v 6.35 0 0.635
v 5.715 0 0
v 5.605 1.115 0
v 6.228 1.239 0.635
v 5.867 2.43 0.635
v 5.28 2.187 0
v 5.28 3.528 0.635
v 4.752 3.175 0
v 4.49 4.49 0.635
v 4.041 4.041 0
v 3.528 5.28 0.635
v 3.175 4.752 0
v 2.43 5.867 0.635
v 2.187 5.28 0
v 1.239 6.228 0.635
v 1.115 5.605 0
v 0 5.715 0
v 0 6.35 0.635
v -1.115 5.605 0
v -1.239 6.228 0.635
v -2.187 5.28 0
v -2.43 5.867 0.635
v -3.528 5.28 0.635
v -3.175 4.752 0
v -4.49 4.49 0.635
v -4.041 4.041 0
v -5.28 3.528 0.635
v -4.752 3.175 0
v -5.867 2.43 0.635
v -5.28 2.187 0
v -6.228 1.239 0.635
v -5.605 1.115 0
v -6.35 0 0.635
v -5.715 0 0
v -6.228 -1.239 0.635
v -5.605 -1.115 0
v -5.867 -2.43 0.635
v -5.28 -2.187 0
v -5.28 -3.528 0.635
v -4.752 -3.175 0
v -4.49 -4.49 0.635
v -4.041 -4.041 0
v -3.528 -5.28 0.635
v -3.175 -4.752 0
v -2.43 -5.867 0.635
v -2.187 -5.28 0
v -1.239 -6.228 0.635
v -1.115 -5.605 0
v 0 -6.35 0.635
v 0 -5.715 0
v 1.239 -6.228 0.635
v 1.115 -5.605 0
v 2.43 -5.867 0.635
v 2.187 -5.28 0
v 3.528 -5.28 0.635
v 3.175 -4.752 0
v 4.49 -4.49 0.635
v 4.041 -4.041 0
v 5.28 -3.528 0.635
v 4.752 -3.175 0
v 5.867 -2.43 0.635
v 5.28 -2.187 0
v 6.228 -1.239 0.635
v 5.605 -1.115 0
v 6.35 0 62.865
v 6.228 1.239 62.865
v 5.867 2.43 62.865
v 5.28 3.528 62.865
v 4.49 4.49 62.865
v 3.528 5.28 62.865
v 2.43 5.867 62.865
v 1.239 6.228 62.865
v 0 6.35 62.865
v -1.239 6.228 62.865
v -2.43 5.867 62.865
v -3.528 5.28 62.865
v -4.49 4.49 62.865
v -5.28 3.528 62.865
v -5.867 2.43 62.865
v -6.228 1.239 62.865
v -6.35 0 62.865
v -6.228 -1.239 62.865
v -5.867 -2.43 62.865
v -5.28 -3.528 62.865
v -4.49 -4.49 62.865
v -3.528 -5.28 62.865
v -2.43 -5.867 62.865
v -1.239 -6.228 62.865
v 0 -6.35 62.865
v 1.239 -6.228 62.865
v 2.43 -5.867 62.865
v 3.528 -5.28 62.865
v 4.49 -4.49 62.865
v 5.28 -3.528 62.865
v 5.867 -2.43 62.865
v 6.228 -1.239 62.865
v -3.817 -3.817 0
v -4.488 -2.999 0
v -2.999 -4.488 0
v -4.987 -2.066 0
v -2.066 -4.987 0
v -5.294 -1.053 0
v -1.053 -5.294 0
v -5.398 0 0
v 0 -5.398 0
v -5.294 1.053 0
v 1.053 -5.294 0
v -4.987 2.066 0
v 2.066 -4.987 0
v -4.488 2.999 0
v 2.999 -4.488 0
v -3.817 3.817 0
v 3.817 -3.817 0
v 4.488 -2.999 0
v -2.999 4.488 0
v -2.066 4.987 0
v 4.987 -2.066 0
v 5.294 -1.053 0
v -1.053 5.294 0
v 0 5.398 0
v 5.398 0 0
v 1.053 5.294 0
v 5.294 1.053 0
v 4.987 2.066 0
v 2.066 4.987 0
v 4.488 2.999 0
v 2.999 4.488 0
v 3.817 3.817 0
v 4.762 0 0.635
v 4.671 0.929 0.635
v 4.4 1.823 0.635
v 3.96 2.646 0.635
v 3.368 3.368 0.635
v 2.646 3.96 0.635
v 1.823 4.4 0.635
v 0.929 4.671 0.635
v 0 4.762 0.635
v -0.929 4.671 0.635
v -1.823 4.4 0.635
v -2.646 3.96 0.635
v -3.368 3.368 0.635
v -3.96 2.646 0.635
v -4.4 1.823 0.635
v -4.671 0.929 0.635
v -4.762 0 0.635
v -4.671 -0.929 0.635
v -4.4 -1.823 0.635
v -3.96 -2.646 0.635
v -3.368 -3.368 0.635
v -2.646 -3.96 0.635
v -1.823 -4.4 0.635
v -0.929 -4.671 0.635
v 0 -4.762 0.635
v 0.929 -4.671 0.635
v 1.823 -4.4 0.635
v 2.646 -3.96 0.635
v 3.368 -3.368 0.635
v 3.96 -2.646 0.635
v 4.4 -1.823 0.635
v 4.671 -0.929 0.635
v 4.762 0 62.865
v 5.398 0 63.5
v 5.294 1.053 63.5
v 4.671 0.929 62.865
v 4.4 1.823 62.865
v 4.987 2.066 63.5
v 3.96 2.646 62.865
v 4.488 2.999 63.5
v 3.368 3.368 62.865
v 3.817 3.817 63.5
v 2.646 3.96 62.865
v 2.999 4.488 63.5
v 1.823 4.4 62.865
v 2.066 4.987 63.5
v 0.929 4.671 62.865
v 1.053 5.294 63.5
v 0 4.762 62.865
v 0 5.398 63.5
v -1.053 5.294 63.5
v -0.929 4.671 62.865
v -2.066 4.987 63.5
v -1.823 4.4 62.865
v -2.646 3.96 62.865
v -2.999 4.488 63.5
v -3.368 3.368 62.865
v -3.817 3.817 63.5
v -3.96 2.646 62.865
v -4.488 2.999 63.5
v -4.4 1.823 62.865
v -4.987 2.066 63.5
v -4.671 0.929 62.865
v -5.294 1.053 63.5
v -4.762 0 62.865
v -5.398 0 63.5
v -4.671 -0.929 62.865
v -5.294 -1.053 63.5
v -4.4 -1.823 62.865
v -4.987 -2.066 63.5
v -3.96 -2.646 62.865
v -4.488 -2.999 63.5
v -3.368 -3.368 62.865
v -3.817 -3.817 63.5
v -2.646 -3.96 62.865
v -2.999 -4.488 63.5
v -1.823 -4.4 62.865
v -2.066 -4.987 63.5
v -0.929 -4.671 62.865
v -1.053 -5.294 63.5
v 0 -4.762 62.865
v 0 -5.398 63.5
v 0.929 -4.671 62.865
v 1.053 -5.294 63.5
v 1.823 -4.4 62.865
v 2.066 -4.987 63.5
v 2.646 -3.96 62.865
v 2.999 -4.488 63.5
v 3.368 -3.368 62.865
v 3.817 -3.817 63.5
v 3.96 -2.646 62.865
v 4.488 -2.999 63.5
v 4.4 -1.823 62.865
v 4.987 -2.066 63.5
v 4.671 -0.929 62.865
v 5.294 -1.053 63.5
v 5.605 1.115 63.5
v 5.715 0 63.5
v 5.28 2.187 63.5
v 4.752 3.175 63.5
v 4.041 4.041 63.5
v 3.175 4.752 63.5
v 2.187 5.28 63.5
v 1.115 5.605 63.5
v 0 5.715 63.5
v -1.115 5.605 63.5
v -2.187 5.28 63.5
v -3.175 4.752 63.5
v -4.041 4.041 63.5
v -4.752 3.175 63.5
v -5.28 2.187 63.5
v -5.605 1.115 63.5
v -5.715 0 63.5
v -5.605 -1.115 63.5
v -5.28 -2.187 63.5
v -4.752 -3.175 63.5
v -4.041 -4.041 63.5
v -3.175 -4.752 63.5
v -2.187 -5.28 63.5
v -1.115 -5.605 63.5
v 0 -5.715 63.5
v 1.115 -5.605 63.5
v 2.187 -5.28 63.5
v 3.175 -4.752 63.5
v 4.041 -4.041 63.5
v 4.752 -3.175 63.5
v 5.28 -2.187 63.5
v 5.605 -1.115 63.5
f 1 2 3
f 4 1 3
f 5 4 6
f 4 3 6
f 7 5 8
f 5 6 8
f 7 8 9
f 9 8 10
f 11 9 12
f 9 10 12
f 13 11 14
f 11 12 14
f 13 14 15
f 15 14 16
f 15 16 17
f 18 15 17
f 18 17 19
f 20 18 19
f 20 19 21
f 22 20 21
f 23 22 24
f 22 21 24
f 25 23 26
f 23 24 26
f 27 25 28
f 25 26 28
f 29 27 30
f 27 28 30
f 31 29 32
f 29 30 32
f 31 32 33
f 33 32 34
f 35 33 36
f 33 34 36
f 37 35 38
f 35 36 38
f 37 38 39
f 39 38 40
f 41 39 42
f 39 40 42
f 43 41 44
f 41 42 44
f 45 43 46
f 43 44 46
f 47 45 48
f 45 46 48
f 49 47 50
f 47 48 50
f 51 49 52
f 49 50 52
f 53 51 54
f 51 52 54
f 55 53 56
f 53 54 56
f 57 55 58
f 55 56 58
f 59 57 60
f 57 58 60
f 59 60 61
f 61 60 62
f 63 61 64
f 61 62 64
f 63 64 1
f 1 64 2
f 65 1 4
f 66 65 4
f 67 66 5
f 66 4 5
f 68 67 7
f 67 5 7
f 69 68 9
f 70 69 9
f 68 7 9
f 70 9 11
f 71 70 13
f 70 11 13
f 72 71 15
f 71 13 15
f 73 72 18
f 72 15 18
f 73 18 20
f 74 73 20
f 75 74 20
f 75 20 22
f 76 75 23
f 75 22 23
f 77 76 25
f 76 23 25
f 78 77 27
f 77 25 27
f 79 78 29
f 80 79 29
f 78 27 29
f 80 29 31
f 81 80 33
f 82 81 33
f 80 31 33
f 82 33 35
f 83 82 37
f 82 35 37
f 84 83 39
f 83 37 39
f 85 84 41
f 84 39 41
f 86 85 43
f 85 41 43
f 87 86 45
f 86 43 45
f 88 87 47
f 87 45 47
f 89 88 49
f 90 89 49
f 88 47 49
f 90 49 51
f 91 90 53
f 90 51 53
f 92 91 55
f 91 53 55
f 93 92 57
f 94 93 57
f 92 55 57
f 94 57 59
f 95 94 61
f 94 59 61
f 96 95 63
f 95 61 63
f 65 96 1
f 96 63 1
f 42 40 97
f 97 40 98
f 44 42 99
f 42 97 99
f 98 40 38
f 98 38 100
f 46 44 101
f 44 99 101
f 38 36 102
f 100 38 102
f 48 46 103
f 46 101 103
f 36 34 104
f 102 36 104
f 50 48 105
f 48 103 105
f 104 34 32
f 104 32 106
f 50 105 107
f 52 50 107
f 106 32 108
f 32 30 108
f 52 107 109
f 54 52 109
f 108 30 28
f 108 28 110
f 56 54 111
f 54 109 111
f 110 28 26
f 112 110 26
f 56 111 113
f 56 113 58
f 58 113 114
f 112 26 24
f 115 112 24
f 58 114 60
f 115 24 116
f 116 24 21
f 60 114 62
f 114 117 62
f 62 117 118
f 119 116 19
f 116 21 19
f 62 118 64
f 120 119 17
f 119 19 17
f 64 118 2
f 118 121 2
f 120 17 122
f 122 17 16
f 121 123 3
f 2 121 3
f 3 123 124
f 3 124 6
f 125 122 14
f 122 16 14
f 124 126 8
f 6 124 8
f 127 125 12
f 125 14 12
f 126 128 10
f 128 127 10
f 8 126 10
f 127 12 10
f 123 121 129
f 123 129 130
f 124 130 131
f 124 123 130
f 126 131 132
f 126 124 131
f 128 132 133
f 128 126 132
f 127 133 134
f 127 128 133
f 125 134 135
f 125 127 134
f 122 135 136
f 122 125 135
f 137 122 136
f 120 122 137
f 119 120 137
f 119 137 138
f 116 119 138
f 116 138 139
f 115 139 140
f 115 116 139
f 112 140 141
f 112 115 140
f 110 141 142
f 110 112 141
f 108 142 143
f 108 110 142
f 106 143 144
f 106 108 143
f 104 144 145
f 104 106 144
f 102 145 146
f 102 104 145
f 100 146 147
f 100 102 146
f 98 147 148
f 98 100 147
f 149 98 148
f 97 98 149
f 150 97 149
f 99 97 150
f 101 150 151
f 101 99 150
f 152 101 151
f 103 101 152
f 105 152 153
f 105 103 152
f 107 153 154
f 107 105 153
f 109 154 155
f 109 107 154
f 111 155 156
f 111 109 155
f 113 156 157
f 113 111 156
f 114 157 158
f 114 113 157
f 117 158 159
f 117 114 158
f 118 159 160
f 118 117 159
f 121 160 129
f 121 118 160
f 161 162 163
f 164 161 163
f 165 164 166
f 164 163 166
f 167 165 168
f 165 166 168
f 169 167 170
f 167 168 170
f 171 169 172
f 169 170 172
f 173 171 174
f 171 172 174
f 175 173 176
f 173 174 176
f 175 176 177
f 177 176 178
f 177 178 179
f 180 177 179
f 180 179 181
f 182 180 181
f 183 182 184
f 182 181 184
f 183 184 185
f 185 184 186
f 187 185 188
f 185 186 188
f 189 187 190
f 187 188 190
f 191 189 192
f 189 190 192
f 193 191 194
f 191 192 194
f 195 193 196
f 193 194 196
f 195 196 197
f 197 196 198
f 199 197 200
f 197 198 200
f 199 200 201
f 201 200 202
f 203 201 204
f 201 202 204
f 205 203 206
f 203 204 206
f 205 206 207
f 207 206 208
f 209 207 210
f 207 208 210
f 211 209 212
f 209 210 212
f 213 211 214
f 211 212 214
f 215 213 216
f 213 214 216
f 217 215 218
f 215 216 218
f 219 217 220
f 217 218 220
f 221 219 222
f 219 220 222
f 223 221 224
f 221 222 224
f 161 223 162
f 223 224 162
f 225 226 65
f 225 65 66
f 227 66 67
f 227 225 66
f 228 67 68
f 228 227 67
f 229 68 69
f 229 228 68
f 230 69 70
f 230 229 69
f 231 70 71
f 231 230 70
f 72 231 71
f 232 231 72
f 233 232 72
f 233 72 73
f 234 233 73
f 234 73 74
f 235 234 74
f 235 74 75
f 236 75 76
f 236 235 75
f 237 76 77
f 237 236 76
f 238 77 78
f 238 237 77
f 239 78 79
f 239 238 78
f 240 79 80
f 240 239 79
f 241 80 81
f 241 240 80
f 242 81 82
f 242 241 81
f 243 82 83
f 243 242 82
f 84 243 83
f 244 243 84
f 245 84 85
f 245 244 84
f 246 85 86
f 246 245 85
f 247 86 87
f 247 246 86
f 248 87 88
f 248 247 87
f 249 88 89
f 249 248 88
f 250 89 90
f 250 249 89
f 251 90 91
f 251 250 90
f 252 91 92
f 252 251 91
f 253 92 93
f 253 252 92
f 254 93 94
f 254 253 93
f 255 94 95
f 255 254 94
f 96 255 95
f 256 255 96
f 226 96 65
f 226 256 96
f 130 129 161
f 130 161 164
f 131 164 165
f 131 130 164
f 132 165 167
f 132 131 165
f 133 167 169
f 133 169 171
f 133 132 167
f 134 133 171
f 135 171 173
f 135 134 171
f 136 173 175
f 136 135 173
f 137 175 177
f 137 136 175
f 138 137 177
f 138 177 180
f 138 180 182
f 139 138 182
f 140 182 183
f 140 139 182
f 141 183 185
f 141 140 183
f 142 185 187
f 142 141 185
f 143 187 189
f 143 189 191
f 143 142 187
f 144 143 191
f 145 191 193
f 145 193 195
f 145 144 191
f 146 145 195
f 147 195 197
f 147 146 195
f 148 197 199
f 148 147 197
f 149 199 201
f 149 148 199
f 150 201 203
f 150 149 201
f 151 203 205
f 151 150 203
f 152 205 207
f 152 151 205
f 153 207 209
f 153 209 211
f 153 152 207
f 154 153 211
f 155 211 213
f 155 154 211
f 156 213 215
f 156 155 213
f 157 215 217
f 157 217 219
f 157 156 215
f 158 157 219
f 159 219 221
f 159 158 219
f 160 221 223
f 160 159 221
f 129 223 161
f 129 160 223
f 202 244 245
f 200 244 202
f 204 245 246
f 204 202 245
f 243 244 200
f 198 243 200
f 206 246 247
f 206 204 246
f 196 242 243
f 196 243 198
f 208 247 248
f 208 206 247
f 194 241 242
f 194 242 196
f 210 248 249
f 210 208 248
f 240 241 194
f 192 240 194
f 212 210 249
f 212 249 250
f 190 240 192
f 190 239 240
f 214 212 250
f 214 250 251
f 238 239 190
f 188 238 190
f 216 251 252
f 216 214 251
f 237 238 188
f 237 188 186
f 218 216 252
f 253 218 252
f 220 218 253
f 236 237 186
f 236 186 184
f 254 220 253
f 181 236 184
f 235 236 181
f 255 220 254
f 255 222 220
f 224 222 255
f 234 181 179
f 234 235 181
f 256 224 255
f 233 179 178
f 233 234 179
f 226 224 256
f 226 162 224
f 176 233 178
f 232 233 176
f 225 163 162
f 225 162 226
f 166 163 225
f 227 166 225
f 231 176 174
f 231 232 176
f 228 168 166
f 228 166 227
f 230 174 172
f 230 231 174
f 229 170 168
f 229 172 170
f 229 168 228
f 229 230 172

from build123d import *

# Parameters (mm, degrees)
F0_R     = 6.35
F0_R_2   = 4.7625
F1_DEPTH = 63.5
F2_SIZE  = 0.635


with BuildPart() as f1:
    # F0 (on Top) → F1 (new body)
    with BuildSketch(Plane.XY):
        Circle(F0_R)
        Circle(F0_R_2, mode=Mode.SUBTRACT)
    extrude(amount=F1_DEPTH)

    # F2
    f2_edges = [f1.edges().sort_by_distance(p)[0] for p in [
        (6.35, 0, 31.75),
        (-6.35, 0, 0),
        (-6.35, 0, 63.5),
        (4.7625, 0, 31.75),
        (-4.7625, 0, 0),
        (-4.7625, 0, 63.5),
    ]]
    chamfer(f2_edges, length=F2_SIZE)


solid = f1.part
